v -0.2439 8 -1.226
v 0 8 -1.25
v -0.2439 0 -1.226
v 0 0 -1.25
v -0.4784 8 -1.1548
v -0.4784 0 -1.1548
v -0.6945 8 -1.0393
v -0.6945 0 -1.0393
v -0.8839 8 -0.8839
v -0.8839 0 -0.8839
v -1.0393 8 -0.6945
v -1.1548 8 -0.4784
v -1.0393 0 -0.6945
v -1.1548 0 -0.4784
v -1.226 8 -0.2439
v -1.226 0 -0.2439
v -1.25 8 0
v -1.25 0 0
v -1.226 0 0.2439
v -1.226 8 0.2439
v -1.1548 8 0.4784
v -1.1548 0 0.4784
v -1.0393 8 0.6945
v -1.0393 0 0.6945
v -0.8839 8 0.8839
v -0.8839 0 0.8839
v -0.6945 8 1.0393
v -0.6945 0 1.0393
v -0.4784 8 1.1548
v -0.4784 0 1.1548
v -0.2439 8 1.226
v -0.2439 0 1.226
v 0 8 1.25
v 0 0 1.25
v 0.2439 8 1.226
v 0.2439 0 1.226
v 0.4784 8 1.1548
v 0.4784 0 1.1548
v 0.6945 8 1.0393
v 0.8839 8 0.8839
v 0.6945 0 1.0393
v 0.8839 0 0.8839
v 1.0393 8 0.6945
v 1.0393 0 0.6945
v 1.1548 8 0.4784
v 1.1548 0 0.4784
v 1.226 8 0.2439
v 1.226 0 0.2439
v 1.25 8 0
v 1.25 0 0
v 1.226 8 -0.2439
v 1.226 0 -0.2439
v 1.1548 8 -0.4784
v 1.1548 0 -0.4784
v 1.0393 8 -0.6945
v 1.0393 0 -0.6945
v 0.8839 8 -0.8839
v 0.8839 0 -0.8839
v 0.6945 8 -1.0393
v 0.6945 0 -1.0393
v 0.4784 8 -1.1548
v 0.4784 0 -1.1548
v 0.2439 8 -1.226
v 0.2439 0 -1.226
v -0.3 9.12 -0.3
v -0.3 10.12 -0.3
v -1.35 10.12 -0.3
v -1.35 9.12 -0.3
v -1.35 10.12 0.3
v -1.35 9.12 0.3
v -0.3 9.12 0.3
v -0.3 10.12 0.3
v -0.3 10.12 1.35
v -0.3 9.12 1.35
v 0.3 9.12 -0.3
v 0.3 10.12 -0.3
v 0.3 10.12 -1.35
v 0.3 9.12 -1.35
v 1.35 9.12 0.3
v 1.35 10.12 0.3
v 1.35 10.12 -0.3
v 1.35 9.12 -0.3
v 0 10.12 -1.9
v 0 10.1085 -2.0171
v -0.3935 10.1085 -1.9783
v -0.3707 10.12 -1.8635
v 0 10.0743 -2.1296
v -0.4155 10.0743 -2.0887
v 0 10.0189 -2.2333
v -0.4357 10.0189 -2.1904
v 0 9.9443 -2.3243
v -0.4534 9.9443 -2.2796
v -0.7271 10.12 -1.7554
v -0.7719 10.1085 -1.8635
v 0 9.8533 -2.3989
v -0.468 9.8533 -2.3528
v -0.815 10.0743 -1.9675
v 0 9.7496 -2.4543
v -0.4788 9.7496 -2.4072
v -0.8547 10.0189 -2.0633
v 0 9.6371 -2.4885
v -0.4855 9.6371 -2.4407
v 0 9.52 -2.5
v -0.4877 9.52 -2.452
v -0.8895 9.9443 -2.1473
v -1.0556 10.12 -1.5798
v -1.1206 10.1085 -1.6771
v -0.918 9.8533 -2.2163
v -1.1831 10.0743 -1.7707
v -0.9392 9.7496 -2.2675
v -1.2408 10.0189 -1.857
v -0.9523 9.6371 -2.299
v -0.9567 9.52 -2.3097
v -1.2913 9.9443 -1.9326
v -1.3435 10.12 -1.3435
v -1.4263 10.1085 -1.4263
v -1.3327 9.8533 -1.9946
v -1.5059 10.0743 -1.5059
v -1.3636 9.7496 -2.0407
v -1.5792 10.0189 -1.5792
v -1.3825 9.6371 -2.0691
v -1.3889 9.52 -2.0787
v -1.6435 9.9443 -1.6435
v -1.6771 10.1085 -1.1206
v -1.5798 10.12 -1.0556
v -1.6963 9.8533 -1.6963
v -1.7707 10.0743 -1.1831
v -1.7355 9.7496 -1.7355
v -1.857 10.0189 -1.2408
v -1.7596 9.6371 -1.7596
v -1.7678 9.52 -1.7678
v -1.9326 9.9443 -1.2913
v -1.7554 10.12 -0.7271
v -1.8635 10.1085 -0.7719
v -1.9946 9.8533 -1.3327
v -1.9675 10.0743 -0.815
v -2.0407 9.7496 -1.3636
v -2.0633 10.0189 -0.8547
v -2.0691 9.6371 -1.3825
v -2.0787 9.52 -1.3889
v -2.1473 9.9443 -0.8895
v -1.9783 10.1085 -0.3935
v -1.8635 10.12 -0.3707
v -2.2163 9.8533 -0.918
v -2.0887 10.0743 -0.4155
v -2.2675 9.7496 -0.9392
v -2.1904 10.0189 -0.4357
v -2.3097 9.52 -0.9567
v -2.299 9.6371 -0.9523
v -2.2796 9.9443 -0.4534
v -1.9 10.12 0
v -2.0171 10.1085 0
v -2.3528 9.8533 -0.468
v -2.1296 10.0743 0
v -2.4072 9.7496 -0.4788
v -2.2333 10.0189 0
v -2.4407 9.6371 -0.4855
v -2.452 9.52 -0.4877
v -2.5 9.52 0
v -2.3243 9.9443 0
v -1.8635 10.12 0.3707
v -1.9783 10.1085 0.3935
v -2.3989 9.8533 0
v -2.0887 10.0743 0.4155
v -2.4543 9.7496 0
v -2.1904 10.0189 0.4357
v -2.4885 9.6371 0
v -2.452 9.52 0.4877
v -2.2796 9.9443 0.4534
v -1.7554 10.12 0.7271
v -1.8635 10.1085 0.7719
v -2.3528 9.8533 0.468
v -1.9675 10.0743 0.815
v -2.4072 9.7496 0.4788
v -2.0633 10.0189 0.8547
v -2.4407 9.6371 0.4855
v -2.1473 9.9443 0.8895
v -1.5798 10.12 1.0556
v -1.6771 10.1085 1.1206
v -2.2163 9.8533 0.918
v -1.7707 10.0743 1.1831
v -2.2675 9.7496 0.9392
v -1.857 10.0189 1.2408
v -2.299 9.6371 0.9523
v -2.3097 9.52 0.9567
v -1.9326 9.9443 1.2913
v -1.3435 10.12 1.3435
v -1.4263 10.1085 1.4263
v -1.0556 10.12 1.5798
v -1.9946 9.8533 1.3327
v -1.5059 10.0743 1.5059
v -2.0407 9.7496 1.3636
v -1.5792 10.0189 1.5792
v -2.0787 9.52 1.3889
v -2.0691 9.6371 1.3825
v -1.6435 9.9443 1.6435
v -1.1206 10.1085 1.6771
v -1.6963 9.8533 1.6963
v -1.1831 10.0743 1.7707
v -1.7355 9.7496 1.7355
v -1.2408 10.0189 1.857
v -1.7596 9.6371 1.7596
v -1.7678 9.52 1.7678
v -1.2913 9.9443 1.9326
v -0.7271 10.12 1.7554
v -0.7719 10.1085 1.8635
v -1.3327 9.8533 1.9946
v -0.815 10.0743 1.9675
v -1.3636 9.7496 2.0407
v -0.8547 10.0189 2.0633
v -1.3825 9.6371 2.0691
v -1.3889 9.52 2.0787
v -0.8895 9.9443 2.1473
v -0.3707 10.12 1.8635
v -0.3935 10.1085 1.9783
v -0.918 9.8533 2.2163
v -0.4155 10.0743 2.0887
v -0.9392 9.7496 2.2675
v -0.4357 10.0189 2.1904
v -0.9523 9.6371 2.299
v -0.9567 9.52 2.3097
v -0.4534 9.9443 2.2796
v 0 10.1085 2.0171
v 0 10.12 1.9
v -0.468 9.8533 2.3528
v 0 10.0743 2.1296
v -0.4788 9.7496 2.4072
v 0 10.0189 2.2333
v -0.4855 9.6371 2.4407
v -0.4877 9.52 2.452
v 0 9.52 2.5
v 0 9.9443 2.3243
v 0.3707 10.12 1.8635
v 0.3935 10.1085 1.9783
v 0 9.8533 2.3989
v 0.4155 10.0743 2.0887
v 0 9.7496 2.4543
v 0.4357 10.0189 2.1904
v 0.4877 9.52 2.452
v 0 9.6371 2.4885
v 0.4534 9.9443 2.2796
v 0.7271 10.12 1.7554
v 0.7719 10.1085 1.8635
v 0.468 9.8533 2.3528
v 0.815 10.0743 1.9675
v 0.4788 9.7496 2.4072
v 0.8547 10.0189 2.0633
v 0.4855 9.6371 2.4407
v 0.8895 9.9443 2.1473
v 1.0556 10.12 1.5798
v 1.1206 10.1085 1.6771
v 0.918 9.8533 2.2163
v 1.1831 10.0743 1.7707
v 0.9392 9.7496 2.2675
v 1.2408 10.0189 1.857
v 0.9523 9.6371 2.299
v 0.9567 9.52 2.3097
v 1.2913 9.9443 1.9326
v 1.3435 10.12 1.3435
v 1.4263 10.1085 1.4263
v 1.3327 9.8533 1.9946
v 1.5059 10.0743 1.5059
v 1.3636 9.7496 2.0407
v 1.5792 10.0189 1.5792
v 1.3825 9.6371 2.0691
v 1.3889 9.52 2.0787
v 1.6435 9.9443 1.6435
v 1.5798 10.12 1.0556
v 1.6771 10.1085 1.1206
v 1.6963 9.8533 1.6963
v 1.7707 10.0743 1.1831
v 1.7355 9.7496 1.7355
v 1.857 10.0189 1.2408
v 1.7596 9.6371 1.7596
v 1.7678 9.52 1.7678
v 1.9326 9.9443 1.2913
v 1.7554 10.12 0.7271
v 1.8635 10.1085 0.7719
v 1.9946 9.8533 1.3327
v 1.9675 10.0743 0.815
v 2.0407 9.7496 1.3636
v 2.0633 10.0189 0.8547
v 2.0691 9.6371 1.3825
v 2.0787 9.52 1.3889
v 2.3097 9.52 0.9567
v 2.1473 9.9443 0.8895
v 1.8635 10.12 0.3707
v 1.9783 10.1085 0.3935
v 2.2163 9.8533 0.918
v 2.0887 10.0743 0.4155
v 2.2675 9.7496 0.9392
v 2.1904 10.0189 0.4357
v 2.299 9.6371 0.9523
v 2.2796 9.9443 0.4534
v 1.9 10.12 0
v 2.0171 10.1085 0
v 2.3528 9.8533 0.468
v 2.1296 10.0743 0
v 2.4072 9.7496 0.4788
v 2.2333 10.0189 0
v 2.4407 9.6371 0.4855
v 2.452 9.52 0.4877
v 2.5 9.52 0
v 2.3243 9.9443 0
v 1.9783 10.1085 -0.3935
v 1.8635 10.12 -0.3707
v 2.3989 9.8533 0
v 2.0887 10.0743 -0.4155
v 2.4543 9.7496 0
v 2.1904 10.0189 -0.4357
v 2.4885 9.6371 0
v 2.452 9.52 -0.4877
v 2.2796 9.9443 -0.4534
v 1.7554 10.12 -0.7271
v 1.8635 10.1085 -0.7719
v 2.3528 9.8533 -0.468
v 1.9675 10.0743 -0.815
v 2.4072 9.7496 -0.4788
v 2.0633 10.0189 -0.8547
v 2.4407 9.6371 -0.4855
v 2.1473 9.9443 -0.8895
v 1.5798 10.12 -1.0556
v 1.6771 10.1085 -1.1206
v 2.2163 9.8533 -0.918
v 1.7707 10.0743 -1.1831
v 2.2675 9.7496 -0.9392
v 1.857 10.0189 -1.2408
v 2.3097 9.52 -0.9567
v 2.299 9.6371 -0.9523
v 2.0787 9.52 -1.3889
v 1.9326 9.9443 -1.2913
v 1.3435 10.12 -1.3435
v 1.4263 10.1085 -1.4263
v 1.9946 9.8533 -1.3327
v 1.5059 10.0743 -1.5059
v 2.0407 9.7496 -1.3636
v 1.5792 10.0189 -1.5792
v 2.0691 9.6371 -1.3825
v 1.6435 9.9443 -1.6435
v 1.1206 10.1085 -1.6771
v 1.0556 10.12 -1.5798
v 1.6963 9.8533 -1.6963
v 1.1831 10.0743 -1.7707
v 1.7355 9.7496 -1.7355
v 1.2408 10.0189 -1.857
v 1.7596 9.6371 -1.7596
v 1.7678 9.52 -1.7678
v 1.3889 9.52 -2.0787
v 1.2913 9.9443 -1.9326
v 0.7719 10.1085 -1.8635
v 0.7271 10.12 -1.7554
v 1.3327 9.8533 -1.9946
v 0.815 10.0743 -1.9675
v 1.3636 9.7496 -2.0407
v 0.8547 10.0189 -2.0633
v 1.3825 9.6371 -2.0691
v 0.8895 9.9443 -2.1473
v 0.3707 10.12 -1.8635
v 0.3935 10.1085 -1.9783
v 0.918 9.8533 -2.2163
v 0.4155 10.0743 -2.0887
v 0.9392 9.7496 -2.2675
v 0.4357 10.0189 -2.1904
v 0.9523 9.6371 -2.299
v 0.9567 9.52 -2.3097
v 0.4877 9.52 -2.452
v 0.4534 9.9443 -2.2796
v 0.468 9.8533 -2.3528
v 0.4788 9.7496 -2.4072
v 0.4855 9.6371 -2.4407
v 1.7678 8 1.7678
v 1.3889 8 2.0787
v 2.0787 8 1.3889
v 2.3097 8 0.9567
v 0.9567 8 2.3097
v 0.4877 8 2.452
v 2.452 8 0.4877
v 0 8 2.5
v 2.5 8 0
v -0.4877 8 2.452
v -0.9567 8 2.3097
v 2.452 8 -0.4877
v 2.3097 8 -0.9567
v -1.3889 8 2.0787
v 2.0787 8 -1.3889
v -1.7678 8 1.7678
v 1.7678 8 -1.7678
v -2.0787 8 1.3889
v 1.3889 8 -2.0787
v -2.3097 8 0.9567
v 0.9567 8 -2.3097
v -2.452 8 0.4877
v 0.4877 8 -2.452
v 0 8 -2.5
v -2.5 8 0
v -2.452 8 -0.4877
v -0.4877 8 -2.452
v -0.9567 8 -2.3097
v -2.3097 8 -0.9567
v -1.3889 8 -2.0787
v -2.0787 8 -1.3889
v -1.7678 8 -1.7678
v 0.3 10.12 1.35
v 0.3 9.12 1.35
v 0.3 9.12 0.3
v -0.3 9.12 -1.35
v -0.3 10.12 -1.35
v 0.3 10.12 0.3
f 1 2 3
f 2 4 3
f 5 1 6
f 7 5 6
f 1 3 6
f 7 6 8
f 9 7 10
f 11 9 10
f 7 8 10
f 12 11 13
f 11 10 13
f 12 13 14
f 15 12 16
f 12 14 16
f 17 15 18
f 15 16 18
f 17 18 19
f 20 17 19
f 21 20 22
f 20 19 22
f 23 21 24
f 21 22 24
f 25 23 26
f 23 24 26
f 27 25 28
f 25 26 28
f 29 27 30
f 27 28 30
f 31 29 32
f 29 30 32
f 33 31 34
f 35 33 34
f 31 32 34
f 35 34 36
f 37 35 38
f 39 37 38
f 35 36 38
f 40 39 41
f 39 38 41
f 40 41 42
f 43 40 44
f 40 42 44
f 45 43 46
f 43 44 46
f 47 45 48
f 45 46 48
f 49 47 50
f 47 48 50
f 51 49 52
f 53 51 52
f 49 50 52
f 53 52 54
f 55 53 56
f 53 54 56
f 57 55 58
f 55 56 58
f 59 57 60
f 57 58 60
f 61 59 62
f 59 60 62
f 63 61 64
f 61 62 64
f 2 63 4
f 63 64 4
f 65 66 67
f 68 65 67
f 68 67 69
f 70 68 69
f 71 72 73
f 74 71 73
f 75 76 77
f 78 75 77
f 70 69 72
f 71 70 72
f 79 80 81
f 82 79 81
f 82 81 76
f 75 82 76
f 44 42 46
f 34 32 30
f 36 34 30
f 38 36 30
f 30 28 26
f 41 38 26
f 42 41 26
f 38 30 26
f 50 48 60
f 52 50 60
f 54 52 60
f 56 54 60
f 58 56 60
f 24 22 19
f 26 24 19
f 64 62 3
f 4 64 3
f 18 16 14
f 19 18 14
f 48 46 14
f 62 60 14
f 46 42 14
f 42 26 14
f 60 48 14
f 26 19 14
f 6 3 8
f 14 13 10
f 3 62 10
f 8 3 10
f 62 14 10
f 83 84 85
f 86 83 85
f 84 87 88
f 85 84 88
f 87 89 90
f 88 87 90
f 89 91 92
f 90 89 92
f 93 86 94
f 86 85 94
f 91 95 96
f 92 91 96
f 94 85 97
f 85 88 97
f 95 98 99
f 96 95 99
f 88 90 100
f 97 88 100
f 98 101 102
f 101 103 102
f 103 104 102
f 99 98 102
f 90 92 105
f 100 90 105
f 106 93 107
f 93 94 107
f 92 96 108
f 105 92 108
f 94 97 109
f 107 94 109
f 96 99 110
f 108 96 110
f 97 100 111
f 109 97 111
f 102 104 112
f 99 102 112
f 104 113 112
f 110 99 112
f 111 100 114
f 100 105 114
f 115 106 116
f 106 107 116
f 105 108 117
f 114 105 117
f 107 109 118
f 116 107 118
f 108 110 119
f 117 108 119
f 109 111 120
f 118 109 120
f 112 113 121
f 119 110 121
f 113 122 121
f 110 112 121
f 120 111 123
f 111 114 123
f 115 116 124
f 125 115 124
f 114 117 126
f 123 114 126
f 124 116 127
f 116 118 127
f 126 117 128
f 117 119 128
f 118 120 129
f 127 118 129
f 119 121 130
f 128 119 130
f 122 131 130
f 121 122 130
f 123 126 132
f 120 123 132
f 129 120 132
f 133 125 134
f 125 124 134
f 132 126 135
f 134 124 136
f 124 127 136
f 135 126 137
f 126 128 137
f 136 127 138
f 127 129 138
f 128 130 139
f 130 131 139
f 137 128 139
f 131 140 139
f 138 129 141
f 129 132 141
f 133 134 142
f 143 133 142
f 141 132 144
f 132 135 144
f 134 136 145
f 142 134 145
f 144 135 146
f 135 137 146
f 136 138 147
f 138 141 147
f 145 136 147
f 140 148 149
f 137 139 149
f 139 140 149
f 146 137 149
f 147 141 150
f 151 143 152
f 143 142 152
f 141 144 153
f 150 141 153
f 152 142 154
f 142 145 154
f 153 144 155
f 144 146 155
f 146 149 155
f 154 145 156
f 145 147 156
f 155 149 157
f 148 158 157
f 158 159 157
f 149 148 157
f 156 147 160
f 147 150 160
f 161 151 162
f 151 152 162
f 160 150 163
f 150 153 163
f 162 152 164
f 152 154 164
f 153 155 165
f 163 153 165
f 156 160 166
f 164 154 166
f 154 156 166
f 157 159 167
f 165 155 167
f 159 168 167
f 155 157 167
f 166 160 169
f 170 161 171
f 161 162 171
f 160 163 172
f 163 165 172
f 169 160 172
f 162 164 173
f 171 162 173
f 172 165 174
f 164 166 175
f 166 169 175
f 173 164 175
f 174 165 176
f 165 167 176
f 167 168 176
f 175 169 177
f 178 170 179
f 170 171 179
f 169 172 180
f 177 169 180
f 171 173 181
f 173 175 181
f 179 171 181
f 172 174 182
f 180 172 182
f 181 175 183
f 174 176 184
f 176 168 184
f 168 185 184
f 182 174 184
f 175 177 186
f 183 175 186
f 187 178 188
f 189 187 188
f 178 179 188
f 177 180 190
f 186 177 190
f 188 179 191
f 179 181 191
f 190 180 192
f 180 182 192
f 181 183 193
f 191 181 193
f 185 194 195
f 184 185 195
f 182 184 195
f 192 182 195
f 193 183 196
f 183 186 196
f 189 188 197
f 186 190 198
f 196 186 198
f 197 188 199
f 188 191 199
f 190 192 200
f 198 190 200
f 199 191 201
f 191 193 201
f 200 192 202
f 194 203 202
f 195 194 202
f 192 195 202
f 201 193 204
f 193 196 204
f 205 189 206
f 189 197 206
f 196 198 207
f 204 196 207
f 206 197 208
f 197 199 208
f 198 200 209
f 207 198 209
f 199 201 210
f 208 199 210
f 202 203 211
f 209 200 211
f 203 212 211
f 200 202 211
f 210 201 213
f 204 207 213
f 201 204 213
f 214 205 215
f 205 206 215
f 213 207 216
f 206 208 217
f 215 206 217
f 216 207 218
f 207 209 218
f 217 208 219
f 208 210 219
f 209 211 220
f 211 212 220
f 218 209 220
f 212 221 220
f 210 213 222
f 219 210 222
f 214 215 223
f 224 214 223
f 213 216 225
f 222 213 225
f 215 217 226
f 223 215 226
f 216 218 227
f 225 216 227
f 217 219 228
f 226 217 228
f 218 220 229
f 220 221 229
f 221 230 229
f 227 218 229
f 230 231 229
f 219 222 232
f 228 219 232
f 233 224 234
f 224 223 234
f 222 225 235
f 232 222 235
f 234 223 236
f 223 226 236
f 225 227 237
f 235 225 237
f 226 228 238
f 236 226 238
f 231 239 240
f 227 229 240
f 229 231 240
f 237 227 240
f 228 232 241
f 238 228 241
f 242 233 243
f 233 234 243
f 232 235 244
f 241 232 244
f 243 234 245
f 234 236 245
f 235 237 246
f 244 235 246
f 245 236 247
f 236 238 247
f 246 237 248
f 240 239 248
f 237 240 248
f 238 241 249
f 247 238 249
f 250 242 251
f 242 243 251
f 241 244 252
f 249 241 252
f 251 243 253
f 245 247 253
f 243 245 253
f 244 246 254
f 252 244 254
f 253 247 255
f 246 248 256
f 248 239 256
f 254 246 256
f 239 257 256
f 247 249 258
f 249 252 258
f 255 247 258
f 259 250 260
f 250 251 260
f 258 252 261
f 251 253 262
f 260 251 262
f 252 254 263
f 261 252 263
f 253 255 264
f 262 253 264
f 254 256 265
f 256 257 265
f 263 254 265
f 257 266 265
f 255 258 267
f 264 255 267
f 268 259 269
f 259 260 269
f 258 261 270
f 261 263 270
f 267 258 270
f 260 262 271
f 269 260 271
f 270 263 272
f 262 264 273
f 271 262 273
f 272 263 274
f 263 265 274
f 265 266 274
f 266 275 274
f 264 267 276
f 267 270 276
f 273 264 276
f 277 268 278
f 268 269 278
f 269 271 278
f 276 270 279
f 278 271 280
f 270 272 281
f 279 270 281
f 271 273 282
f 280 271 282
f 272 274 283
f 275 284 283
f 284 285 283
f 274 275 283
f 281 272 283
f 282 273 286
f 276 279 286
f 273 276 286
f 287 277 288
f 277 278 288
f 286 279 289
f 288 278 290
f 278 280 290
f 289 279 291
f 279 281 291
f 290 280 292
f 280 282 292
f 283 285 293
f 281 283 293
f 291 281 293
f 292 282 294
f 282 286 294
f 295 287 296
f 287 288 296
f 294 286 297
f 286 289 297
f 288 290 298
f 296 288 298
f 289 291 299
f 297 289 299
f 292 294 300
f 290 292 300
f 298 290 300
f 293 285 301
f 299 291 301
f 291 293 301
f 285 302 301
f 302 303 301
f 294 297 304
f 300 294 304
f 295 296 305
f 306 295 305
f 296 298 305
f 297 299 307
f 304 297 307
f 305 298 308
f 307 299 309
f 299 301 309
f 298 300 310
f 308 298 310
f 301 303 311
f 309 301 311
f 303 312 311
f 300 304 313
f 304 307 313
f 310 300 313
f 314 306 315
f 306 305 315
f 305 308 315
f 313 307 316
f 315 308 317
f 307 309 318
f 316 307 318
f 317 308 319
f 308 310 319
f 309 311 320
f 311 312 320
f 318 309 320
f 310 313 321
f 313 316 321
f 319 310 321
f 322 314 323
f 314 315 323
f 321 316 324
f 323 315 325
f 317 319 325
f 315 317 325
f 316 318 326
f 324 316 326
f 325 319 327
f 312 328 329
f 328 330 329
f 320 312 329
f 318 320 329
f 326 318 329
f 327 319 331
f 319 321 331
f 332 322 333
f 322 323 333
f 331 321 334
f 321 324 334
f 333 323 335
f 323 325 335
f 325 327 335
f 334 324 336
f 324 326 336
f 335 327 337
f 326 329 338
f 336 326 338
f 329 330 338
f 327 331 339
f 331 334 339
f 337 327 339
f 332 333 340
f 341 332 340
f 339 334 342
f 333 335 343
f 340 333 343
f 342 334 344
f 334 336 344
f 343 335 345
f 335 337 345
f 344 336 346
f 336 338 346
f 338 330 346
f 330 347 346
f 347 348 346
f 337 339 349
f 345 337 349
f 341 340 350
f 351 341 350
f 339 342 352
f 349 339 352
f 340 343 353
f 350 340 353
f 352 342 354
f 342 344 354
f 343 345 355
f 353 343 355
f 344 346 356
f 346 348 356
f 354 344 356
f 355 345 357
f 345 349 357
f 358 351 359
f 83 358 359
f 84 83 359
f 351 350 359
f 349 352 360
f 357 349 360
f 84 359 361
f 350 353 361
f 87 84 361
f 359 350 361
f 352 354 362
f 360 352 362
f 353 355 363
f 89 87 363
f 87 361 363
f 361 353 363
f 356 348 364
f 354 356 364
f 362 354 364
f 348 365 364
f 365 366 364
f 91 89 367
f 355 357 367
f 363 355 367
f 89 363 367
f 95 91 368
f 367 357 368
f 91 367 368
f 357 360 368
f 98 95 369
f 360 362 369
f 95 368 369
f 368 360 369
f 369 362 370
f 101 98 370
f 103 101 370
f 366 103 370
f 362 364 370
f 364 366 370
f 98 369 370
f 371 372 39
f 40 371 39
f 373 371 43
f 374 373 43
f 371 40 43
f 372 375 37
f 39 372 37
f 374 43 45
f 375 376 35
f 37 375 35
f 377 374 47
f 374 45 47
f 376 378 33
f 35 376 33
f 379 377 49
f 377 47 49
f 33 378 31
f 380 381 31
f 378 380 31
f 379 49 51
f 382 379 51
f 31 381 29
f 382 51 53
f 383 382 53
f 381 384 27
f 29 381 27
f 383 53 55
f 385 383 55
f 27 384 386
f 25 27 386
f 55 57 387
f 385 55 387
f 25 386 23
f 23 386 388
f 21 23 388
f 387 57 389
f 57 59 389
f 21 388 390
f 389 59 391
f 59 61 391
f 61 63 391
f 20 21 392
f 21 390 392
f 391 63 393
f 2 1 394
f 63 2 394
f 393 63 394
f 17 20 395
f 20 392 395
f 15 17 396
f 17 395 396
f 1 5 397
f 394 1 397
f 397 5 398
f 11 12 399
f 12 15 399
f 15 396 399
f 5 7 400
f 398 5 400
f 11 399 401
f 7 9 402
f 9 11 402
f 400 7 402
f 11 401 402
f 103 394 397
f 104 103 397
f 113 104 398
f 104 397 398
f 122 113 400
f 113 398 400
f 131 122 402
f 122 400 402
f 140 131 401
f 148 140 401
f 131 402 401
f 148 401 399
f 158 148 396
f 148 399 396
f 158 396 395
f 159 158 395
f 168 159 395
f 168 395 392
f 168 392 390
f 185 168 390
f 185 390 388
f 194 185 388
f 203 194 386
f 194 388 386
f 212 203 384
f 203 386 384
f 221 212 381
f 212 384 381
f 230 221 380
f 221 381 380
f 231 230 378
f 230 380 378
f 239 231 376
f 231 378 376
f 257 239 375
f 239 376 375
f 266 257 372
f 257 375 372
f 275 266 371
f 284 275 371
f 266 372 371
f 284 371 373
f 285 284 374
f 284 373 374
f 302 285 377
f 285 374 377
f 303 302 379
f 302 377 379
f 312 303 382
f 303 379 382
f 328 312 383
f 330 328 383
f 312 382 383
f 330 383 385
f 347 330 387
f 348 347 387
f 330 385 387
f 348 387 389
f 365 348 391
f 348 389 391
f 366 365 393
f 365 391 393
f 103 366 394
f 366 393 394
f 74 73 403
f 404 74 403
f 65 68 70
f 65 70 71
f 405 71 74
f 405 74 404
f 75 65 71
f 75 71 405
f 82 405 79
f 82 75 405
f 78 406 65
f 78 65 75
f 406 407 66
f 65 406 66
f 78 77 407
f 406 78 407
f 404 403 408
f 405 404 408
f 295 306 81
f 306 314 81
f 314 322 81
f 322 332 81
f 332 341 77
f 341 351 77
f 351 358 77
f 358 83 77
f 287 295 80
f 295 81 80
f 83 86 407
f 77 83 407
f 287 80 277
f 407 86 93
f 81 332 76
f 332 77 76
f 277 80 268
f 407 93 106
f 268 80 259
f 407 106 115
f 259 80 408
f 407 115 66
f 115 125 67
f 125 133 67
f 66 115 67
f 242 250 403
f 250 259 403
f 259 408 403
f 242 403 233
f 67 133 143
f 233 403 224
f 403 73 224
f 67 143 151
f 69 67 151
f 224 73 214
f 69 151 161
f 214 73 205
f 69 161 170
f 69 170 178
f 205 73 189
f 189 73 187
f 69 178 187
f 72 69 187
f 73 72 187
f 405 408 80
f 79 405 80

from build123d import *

# Parameters (mm, degrees)
CUT_EXTRUDE1_DEPTH = 1
FILLET1_R          = 0.6


with BuildPart() as part:
    # Sketch1 → Revolve1 (revolve)
    with BuildSketch(Plane.XY, mode=Mode.PRIVATE) as revolve1_sk:
        Polygon((0, 0), (0, 10.12), (2.5, 10.12), (2.5, 8), (1.25, 8), (1.25, 0), align=None)
    revolve(revolve1_sk.sketch.rotate(Axis((0, 0, 0), (0, 1, 0)), 90), axis=Axis((0, 0, 0), (0, 1, 0)))

    # Sketch2 → Cut-Extrude1 (cut)
    with BuildSketch(Plane(origin=(0, 10.12, 0), x_dir=(1, 0, 0), z_dir=(0, 1, 0))):
        Polygon((-0.3, 0.3), (-1.35, 0.3), (-1.35, -0.3), (-0.3, -0.3), (-0.3, -1.35), (0.3, -1.35), (0.3, -0.3), (1.35, -0.3), (1.35, 0.3), (0.3, 0.3), (0.3, 1.35), (-0.3, 1.35), align=None)
    extrude(amount=-CUT_EXTRUDE1_DEPTH, mode=Mode.SUBTRACT)

    # Fillet1
    fillet1_edges = [part.edges().sort_by_distance(p)[0] for p in [
        (0, 10.12, 2.5),
    ]]
    fillet(fillet1_edges, radius=FILLET1_R)


solid = part.part
